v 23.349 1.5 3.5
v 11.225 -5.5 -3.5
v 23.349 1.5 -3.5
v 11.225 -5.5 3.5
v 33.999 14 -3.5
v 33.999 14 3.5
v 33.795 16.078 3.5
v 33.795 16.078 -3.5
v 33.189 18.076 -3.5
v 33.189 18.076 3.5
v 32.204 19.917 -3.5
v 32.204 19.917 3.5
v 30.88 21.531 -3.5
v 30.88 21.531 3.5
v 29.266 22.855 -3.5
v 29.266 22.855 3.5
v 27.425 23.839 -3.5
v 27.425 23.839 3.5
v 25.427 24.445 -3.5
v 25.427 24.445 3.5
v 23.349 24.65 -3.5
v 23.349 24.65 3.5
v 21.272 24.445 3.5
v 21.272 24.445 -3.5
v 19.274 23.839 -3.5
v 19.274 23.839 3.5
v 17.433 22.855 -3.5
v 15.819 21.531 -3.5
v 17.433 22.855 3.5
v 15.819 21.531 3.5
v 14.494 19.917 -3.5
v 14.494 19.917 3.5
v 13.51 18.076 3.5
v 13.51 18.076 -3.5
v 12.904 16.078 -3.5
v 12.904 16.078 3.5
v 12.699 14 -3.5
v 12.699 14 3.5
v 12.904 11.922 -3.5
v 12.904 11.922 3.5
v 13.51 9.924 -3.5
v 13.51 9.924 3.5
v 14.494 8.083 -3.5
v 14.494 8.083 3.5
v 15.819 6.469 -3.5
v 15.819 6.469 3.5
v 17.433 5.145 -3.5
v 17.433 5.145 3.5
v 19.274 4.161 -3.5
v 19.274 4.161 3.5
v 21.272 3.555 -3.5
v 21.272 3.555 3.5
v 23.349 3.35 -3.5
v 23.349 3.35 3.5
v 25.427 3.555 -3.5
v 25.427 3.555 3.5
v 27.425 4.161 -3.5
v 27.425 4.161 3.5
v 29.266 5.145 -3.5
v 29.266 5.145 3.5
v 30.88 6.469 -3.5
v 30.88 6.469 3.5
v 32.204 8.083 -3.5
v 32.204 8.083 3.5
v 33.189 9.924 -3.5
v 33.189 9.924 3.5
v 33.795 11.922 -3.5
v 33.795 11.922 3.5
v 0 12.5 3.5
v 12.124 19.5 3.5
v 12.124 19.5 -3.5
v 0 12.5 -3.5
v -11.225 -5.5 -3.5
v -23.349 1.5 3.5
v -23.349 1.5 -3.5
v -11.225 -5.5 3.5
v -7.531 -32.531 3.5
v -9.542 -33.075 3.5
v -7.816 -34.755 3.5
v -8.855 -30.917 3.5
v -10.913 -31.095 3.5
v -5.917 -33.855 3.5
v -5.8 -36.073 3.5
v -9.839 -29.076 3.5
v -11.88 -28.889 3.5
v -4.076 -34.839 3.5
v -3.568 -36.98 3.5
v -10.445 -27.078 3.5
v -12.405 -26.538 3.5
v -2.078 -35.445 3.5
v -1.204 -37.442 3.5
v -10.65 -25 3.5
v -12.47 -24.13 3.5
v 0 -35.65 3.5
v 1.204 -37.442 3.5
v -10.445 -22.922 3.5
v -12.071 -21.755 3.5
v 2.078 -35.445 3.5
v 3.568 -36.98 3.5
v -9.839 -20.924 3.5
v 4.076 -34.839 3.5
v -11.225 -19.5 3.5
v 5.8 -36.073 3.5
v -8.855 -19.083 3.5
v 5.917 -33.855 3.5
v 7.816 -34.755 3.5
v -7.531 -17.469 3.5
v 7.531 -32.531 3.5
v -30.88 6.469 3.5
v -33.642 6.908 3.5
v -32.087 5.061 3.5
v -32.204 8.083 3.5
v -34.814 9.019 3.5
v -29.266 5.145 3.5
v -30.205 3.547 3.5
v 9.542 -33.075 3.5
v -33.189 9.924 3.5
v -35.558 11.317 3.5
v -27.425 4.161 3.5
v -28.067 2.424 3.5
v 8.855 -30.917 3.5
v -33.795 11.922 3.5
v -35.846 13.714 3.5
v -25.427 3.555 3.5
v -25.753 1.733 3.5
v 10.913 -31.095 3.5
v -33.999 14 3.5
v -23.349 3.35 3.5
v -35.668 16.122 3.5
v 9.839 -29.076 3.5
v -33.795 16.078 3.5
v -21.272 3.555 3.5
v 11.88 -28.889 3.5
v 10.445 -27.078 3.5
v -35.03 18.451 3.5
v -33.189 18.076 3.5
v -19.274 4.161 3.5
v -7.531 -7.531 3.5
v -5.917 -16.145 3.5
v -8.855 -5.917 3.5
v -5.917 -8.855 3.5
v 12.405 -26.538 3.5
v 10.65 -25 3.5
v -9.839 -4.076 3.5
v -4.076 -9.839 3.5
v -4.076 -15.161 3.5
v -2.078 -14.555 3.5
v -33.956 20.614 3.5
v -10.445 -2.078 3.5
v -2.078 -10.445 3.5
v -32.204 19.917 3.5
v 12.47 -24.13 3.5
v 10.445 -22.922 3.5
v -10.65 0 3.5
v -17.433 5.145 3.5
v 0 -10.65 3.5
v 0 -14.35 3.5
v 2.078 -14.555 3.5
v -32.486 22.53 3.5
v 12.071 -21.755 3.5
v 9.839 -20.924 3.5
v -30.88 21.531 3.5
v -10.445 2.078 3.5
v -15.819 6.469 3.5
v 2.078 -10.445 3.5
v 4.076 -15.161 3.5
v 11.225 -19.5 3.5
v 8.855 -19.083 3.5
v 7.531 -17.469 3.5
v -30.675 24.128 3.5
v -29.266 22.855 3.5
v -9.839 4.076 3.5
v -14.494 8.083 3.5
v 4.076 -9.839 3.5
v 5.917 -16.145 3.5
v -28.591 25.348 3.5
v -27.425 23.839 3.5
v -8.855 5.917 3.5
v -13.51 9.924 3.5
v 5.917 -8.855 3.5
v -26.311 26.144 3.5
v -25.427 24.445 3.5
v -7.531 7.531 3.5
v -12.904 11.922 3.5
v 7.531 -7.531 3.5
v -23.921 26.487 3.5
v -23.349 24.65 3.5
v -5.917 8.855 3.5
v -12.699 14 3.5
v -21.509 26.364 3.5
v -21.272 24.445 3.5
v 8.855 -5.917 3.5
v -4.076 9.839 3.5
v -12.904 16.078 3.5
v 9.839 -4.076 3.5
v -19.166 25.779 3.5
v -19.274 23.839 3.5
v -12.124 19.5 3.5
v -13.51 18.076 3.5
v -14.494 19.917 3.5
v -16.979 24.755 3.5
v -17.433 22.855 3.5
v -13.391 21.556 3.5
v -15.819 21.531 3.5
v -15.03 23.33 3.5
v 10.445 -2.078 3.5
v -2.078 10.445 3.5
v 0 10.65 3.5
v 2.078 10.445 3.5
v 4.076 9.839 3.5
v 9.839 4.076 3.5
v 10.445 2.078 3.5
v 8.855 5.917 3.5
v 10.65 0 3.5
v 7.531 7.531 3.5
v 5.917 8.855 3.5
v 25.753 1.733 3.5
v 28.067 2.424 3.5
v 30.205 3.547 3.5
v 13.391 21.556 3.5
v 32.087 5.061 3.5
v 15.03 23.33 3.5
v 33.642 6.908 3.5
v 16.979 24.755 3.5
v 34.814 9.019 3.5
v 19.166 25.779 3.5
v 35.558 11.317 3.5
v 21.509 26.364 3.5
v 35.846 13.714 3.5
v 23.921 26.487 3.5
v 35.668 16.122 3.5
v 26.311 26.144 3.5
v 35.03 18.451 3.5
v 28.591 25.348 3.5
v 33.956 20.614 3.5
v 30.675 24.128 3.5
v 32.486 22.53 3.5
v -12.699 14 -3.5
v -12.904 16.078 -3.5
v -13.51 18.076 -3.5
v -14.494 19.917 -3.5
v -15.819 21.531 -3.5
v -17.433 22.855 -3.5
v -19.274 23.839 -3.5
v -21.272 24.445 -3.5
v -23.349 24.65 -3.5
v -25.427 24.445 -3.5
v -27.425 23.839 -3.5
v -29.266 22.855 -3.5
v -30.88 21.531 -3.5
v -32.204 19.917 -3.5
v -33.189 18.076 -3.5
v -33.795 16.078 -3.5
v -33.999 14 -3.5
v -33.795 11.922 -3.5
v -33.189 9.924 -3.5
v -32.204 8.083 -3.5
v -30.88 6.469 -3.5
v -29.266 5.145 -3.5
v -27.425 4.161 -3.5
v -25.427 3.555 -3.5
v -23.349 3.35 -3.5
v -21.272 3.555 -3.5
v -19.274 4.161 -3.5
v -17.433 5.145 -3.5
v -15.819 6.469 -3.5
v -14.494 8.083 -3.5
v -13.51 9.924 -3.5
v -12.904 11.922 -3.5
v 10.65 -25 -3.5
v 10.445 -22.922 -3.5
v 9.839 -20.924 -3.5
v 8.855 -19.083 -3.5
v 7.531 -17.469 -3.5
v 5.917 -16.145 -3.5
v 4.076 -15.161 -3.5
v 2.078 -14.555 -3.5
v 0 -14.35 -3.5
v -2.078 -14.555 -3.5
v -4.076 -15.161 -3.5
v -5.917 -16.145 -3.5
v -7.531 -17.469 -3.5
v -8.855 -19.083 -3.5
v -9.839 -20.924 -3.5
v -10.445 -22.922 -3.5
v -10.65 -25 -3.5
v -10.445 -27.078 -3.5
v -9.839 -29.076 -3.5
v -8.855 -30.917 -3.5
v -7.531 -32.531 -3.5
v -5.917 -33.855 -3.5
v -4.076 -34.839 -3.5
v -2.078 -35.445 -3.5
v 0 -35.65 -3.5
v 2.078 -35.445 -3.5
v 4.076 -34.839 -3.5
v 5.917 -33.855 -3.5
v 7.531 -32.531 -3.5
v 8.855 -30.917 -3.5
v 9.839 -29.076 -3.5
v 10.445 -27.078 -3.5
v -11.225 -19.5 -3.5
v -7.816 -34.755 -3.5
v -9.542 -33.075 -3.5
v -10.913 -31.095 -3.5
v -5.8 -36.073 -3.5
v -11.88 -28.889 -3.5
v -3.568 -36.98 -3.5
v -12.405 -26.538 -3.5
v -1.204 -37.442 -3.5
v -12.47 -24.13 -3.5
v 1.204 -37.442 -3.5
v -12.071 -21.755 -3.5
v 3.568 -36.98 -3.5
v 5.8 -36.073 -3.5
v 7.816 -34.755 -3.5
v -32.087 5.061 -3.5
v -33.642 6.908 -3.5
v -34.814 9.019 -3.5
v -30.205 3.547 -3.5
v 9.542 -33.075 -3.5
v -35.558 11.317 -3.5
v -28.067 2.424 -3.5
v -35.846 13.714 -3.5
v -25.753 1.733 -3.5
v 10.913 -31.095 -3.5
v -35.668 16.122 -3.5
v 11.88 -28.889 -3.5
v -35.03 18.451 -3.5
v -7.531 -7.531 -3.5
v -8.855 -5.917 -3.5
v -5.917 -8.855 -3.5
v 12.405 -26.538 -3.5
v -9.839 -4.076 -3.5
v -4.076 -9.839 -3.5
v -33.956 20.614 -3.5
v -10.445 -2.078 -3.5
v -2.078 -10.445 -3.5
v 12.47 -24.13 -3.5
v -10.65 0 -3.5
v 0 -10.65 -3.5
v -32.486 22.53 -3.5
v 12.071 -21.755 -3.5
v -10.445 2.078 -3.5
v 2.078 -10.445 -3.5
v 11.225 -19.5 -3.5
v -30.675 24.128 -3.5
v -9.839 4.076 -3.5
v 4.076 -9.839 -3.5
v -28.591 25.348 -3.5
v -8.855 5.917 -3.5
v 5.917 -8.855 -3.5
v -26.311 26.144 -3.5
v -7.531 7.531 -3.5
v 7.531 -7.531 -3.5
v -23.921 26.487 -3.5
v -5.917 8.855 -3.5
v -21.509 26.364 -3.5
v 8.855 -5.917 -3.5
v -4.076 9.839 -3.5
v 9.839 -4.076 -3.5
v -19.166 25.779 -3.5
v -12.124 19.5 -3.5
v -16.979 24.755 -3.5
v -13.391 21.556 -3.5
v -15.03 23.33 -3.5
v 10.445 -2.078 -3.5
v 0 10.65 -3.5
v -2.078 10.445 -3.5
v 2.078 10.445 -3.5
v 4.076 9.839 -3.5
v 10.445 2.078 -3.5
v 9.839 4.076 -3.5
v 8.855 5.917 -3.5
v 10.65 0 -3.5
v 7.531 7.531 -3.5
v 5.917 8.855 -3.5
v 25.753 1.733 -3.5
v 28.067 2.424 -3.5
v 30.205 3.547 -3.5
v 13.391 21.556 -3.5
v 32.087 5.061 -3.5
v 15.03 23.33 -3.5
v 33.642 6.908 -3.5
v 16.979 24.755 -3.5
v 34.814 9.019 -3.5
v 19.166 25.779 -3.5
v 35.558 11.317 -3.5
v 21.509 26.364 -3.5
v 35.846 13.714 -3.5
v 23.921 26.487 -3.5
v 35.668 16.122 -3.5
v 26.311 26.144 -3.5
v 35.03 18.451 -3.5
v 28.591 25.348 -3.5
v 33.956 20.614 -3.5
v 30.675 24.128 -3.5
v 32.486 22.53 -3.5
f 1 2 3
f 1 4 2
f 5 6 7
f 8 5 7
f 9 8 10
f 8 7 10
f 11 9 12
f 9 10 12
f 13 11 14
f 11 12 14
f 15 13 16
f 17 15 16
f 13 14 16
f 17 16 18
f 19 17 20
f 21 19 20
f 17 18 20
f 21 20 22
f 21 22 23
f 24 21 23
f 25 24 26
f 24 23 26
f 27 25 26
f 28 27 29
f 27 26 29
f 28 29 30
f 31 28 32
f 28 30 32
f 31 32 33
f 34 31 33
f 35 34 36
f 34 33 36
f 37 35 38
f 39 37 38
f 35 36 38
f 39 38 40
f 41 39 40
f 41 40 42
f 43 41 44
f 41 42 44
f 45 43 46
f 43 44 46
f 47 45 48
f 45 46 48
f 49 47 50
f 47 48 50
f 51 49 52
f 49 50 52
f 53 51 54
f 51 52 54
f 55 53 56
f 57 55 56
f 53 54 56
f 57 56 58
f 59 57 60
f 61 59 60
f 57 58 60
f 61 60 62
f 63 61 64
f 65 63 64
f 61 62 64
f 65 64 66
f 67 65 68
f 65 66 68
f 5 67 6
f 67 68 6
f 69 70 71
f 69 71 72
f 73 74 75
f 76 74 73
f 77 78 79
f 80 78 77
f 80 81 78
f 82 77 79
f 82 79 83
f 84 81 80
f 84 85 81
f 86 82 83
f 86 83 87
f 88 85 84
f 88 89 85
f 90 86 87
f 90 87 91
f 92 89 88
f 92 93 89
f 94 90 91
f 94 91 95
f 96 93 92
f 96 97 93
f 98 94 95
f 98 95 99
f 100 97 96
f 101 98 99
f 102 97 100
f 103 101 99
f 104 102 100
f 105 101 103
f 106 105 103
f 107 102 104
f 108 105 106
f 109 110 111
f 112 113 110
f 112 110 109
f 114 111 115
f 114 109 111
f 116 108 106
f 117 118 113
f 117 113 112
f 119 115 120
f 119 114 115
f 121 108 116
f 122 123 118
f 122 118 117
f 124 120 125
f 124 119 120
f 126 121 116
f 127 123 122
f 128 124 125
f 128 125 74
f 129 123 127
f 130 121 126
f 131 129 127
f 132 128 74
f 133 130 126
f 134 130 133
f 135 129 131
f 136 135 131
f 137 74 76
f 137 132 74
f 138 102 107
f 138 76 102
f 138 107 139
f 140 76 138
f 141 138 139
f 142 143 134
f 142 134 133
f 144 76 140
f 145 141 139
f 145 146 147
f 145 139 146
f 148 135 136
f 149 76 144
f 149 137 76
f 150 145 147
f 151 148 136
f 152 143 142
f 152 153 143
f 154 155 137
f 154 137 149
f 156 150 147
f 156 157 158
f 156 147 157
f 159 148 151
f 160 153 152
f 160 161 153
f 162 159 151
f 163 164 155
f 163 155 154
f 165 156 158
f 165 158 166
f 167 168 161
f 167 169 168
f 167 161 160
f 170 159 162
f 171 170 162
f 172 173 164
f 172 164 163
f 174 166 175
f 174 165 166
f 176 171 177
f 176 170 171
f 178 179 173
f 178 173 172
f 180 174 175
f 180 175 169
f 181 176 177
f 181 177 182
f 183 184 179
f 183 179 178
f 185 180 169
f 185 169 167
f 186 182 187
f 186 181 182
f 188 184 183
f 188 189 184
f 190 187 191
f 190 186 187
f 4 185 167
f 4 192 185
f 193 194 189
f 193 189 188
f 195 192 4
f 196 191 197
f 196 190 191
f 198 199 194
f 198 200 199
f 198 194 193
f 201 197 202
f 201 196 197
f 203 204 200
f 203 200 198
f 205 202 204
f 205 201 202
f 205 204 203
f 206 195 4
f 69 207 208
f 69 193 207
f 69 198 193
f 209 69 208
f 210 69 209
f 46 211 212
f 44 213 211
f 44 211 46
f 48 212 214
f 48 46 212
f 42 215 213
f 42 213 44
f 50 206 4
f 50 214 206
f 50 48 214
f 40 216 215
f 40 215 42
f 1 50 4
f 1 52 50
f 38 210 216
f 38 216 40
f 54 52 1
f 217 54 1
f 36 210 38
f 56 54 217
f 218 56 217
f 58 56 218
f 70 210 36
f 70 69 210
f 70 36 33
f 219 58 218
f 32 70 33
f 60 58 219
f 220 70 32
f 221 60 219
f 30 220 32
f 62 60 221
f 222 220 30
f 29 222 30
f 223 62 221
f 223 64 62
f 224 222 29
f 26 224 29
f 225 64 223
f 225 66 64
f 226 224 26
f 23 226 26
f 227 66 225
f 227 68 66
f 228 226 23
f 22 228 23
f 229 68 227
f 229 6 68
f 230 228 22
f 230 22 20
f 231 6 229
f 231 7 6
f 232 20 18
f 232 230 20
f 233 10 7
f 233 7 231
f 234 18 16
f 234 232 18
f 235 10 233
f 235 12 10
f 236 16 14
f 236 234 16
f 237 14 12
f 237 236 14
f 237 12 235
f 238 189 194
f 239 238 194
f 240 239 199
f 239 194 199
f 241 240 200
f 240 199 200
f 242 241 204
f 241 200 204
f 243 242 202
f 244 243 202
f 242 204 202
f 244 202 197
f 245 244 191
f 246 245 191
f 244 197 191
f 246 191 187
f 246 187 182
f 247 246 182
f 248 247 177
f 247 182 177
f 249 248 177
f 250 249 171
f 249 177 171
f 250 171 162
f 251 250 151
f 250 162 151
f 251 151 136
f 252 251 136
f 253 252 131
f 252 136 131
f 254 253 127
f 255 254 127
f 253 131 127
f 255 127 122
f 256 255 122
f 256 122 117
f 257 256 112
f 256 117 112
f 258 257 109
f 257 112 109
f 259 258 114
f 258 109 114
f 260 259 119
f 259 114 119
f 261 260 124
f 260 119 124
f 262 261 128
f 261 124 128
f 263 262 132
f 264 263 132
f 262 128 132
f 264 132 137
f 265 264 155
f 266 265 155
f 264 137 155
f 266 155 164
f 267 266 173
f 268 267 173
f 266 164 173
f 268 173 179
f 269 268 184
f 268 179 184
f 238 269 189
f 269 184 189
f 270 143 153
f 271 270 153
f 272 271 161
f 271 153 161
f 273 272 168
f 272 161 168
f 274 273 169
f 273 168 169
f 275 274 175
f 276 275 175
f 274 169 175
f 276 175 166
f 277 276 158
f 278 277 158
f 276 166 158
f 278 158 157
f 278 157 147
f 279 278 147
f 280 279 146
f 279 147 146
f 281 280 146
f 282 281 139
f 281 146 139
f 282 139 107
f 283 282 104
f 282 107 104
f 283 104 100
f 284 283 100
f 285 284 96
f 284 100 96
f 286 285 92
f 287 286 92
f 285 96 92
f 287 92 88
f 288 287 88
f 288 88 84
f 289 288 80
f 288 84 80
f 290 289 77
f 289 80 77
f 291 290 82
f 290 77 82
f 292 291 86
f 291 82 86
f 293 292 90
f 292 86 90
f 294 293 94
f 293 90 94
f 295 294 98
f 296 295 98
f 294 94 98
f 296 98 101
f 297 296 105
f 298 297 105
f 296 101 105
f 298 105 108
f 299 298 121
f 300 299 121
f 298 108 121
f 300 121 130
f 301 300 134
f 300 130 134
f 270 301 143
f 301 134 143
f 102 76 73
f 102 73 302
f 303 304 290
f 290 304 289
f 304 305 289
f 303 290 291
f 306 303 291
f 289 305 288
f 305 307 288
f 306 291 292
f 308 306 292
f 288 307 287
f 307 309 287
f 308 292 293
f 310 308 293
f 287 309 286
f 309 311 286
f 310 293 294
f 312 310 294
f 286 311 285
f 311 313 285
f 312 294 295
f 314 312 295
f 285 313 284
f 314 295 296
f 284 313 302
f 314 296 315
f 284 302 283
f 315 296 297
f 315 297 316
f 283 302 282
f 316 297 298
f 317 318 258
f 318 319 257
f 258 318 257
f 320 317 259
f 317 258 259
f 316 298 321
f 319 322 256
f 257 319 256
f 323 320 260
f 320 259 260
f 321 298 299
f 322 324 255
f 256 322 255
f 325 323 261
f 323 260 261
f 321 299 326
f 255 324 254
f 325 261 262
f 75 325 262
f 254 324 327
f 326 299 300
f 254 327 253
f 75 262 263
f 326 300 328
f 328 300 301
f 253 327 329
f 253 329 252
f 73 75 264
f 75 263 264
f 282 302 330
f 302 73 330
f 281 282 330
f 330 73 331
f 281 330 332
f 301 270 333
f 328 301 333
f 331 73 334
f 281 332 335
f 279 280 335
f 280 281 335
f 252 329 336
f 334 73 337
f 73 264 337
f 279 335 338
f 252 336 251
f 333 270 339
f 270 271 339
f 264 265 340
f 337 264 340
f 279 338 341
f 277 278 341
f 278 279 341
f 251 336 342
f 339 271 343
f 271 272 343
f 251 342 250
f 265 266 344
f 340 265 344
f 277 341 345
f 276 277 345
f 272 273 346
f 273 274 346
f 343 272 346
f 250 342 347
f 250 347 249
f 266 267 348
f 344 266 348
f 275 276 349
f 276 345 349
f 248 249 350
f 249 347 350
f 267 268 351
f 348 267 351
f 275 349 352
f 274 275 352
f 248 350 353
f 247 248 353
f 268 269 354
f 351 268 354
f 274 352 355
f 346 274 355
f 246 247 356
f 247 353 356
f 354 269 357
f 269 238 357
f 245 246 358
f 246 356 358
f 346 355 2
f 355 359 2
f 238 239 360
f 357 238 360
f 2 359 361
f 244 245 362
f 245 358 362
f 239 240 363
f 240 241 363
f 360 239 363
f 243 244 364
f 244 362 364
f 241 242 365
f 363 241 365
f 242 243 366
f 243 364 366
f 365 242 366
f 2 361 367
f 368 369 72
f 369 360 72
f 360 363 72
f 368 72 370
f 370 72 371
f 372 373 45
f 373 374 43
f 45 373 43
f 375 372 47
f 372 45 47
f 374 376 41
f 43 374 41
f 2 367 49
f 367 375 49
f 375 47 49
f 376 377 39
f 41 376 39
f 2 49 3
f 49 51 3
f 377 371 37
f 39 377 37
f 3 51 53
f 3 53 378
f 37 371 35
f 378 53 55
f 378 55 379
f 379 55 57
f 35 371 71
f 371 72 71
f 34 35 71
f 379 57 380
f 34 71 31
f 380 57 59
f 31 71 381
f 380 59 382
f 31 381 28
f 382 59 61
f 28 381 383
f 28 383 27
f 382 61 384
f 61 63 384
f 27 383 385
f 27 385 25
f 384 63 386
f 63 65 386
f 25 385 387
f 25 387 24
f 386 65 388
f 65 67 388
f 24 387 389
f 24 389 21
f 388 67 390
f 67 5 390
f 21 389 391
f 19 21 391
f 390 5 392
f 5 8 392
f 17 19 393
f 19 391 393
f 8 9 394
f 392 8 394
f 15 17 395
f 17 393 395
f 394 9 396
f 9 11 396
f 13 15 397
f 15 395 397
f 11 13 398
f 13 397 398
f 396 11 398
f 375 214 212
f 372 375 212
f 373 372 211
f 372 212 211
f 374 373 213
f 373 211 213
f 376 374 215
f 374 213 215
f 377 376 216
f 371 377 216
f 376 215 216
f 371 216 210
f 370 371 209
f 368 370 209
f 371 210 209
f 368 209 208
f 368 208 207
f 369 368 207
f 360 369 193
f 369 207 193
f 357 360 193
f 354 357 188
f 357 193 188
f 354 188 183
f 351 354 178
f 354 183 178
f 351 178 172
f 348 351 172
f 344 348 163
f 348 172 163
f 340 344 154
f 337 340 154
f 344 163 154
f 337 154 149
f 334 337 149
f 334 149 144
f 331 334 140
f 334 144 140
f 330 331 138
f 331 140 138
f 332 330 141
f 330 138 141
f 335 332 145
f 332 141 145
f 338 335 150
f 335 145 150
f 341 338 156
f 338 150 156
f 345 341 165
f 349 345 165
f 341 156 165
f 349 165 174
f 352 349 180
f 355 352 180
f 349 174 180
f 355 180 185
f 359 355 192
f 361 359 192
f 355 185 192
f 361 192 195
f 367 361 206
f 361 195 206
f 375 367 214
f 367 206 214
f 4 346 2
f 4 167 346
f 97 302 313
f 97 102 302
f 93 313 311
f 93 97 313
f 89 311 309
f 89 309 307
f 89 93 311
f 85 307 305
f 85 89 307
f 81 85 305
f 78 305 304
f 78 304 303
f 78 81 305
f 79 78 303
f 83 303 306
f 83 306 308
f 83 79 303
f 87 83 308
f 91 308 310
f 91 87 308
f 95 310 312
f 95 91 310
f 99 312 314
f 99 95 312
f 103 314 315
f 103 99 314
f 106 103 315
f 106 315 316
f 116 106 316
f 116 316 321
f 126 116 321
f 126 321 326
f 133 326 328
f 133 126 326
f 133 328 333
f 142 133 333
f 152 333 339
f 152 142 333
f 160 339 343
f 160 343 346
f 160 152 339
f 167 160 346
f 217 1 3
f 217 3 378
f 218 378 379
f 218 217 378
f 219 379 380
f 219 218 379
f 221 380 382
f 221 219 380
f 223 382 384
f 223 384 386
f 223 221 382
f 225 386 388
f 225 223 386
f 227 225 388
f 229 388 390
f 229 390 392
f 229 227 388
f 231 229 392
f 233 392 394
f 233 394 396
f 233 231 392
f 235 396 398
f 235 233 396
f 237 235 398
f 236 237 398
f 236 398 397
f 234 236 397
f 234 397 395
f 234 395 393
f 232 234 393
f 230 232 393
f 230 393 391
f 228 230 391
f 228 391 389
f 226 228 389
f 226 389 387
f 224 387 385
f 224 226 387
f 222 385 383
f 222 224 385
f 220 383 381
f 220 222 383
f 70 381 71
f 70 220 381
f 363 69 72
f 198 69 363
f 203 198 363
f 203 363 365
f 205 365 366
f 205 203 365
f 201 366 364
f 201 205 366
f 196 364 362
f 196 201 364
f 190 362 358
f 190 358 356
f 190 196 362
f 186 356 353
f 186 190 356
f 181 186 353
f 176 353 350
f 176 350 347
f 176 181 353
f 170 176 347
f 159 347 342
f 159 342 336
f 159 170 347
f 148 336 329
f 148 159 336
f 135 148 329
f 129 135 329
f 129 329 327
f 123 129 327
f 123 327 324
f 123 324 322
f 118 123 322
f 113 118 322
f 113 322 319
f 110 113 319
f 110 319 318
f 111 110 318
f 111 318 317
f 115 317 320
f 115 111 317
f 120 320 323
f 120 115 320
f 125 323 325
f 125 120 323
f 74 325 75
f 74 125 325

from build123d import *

# Parameters (mm, degrees)
F1_DEPTH = 3.5
F2_R     = 10.65
F3_DEPTH = 7


with BuildPart() as f1:
    # F0 (on Top) → F1 (new body, symmetric)
    with BuildSketch(Plane.XY):
        with BuildLine():
            ThreePointArc((11.2249721603, -5.5), (12.1770717335, -2.8229282665), (12.5, 0))
            ThreePointArc((12.5, 0), (8.8388347648, 8.8388347648), (0, 12.5))
            ThreePointArc((0, 12.5), (-10.6066017178, 6.6143782777), (-11.2249721603, -5.5))
            ThreePointArc((-11.2249721603, -5.5), (0, -12.5), (11.2249721603, -5.5))
        make_face()
        with BuildLine():
            ThreePointArc((0, 12.5), (8.8388347648, 8.8388347648), (12.5, 0))
            ThreePointArc((12.5, 0), (12.1770717335, -2.8229282665), (11.2249721603, -5.5))
            Line((11.2249721603, -5.5), (23.3493278133, 1.5))
            ThreePointArc((23.3493278133, 1.5), (33.9559295311, 20.6143782777), (12.124355653, 19.5))
            Line((12.124355653, 19.5), (0, 12.5))
        make_face()
        with BuildLine():
            ThreePointArc((-11.2249721603, -5.5), (-10.6066017178, 6.6143782777), (0, 12.5))
            Line((0, 12.5), (-12.124355653, 19.5))
            ThreePointArc((-12.124355653, 19.5), (-33.9559295311, 20.6143782777), (-23.3493278133, 1.5))
            Line((-23.3493278133, 1.5), (-11.2249721603, -5.5))
        make_face()
        with BuildLine():
            Line((11.2249721603, -19.5), (11.2249721603, -5.5))
            ThreePointArc((11.2249721603, -5.5), (0, -12.5), (-11.2249721603, -5.5))
            Line((-11.2249721603, -5.5), (-11.2249721603, -19.5))
            ThreePointArc((-11.2249721603, -19.5), (0, -37.5), (11.2249721603, -19.5))
        make_face()
    extrude(amount=F1_DEPTH, both=True)

    # F2 (on face) → F3 (cut, symmetric)
    with BuildSketch(Plane.XY.offset(3.5)):
        with Locations((-23.3493278133, 14)):
            Circle(F2_R)
        Circle(F2_R)
        with Locations((23.3493278133, 14)):
            Circle(F2_R)
        with Locations((0, -25)):
            Circle(F2_R)
    extrude(amount=F3_DEPTH, both=True, mode=Mode.SUBTRACT)


solid = f1.part
